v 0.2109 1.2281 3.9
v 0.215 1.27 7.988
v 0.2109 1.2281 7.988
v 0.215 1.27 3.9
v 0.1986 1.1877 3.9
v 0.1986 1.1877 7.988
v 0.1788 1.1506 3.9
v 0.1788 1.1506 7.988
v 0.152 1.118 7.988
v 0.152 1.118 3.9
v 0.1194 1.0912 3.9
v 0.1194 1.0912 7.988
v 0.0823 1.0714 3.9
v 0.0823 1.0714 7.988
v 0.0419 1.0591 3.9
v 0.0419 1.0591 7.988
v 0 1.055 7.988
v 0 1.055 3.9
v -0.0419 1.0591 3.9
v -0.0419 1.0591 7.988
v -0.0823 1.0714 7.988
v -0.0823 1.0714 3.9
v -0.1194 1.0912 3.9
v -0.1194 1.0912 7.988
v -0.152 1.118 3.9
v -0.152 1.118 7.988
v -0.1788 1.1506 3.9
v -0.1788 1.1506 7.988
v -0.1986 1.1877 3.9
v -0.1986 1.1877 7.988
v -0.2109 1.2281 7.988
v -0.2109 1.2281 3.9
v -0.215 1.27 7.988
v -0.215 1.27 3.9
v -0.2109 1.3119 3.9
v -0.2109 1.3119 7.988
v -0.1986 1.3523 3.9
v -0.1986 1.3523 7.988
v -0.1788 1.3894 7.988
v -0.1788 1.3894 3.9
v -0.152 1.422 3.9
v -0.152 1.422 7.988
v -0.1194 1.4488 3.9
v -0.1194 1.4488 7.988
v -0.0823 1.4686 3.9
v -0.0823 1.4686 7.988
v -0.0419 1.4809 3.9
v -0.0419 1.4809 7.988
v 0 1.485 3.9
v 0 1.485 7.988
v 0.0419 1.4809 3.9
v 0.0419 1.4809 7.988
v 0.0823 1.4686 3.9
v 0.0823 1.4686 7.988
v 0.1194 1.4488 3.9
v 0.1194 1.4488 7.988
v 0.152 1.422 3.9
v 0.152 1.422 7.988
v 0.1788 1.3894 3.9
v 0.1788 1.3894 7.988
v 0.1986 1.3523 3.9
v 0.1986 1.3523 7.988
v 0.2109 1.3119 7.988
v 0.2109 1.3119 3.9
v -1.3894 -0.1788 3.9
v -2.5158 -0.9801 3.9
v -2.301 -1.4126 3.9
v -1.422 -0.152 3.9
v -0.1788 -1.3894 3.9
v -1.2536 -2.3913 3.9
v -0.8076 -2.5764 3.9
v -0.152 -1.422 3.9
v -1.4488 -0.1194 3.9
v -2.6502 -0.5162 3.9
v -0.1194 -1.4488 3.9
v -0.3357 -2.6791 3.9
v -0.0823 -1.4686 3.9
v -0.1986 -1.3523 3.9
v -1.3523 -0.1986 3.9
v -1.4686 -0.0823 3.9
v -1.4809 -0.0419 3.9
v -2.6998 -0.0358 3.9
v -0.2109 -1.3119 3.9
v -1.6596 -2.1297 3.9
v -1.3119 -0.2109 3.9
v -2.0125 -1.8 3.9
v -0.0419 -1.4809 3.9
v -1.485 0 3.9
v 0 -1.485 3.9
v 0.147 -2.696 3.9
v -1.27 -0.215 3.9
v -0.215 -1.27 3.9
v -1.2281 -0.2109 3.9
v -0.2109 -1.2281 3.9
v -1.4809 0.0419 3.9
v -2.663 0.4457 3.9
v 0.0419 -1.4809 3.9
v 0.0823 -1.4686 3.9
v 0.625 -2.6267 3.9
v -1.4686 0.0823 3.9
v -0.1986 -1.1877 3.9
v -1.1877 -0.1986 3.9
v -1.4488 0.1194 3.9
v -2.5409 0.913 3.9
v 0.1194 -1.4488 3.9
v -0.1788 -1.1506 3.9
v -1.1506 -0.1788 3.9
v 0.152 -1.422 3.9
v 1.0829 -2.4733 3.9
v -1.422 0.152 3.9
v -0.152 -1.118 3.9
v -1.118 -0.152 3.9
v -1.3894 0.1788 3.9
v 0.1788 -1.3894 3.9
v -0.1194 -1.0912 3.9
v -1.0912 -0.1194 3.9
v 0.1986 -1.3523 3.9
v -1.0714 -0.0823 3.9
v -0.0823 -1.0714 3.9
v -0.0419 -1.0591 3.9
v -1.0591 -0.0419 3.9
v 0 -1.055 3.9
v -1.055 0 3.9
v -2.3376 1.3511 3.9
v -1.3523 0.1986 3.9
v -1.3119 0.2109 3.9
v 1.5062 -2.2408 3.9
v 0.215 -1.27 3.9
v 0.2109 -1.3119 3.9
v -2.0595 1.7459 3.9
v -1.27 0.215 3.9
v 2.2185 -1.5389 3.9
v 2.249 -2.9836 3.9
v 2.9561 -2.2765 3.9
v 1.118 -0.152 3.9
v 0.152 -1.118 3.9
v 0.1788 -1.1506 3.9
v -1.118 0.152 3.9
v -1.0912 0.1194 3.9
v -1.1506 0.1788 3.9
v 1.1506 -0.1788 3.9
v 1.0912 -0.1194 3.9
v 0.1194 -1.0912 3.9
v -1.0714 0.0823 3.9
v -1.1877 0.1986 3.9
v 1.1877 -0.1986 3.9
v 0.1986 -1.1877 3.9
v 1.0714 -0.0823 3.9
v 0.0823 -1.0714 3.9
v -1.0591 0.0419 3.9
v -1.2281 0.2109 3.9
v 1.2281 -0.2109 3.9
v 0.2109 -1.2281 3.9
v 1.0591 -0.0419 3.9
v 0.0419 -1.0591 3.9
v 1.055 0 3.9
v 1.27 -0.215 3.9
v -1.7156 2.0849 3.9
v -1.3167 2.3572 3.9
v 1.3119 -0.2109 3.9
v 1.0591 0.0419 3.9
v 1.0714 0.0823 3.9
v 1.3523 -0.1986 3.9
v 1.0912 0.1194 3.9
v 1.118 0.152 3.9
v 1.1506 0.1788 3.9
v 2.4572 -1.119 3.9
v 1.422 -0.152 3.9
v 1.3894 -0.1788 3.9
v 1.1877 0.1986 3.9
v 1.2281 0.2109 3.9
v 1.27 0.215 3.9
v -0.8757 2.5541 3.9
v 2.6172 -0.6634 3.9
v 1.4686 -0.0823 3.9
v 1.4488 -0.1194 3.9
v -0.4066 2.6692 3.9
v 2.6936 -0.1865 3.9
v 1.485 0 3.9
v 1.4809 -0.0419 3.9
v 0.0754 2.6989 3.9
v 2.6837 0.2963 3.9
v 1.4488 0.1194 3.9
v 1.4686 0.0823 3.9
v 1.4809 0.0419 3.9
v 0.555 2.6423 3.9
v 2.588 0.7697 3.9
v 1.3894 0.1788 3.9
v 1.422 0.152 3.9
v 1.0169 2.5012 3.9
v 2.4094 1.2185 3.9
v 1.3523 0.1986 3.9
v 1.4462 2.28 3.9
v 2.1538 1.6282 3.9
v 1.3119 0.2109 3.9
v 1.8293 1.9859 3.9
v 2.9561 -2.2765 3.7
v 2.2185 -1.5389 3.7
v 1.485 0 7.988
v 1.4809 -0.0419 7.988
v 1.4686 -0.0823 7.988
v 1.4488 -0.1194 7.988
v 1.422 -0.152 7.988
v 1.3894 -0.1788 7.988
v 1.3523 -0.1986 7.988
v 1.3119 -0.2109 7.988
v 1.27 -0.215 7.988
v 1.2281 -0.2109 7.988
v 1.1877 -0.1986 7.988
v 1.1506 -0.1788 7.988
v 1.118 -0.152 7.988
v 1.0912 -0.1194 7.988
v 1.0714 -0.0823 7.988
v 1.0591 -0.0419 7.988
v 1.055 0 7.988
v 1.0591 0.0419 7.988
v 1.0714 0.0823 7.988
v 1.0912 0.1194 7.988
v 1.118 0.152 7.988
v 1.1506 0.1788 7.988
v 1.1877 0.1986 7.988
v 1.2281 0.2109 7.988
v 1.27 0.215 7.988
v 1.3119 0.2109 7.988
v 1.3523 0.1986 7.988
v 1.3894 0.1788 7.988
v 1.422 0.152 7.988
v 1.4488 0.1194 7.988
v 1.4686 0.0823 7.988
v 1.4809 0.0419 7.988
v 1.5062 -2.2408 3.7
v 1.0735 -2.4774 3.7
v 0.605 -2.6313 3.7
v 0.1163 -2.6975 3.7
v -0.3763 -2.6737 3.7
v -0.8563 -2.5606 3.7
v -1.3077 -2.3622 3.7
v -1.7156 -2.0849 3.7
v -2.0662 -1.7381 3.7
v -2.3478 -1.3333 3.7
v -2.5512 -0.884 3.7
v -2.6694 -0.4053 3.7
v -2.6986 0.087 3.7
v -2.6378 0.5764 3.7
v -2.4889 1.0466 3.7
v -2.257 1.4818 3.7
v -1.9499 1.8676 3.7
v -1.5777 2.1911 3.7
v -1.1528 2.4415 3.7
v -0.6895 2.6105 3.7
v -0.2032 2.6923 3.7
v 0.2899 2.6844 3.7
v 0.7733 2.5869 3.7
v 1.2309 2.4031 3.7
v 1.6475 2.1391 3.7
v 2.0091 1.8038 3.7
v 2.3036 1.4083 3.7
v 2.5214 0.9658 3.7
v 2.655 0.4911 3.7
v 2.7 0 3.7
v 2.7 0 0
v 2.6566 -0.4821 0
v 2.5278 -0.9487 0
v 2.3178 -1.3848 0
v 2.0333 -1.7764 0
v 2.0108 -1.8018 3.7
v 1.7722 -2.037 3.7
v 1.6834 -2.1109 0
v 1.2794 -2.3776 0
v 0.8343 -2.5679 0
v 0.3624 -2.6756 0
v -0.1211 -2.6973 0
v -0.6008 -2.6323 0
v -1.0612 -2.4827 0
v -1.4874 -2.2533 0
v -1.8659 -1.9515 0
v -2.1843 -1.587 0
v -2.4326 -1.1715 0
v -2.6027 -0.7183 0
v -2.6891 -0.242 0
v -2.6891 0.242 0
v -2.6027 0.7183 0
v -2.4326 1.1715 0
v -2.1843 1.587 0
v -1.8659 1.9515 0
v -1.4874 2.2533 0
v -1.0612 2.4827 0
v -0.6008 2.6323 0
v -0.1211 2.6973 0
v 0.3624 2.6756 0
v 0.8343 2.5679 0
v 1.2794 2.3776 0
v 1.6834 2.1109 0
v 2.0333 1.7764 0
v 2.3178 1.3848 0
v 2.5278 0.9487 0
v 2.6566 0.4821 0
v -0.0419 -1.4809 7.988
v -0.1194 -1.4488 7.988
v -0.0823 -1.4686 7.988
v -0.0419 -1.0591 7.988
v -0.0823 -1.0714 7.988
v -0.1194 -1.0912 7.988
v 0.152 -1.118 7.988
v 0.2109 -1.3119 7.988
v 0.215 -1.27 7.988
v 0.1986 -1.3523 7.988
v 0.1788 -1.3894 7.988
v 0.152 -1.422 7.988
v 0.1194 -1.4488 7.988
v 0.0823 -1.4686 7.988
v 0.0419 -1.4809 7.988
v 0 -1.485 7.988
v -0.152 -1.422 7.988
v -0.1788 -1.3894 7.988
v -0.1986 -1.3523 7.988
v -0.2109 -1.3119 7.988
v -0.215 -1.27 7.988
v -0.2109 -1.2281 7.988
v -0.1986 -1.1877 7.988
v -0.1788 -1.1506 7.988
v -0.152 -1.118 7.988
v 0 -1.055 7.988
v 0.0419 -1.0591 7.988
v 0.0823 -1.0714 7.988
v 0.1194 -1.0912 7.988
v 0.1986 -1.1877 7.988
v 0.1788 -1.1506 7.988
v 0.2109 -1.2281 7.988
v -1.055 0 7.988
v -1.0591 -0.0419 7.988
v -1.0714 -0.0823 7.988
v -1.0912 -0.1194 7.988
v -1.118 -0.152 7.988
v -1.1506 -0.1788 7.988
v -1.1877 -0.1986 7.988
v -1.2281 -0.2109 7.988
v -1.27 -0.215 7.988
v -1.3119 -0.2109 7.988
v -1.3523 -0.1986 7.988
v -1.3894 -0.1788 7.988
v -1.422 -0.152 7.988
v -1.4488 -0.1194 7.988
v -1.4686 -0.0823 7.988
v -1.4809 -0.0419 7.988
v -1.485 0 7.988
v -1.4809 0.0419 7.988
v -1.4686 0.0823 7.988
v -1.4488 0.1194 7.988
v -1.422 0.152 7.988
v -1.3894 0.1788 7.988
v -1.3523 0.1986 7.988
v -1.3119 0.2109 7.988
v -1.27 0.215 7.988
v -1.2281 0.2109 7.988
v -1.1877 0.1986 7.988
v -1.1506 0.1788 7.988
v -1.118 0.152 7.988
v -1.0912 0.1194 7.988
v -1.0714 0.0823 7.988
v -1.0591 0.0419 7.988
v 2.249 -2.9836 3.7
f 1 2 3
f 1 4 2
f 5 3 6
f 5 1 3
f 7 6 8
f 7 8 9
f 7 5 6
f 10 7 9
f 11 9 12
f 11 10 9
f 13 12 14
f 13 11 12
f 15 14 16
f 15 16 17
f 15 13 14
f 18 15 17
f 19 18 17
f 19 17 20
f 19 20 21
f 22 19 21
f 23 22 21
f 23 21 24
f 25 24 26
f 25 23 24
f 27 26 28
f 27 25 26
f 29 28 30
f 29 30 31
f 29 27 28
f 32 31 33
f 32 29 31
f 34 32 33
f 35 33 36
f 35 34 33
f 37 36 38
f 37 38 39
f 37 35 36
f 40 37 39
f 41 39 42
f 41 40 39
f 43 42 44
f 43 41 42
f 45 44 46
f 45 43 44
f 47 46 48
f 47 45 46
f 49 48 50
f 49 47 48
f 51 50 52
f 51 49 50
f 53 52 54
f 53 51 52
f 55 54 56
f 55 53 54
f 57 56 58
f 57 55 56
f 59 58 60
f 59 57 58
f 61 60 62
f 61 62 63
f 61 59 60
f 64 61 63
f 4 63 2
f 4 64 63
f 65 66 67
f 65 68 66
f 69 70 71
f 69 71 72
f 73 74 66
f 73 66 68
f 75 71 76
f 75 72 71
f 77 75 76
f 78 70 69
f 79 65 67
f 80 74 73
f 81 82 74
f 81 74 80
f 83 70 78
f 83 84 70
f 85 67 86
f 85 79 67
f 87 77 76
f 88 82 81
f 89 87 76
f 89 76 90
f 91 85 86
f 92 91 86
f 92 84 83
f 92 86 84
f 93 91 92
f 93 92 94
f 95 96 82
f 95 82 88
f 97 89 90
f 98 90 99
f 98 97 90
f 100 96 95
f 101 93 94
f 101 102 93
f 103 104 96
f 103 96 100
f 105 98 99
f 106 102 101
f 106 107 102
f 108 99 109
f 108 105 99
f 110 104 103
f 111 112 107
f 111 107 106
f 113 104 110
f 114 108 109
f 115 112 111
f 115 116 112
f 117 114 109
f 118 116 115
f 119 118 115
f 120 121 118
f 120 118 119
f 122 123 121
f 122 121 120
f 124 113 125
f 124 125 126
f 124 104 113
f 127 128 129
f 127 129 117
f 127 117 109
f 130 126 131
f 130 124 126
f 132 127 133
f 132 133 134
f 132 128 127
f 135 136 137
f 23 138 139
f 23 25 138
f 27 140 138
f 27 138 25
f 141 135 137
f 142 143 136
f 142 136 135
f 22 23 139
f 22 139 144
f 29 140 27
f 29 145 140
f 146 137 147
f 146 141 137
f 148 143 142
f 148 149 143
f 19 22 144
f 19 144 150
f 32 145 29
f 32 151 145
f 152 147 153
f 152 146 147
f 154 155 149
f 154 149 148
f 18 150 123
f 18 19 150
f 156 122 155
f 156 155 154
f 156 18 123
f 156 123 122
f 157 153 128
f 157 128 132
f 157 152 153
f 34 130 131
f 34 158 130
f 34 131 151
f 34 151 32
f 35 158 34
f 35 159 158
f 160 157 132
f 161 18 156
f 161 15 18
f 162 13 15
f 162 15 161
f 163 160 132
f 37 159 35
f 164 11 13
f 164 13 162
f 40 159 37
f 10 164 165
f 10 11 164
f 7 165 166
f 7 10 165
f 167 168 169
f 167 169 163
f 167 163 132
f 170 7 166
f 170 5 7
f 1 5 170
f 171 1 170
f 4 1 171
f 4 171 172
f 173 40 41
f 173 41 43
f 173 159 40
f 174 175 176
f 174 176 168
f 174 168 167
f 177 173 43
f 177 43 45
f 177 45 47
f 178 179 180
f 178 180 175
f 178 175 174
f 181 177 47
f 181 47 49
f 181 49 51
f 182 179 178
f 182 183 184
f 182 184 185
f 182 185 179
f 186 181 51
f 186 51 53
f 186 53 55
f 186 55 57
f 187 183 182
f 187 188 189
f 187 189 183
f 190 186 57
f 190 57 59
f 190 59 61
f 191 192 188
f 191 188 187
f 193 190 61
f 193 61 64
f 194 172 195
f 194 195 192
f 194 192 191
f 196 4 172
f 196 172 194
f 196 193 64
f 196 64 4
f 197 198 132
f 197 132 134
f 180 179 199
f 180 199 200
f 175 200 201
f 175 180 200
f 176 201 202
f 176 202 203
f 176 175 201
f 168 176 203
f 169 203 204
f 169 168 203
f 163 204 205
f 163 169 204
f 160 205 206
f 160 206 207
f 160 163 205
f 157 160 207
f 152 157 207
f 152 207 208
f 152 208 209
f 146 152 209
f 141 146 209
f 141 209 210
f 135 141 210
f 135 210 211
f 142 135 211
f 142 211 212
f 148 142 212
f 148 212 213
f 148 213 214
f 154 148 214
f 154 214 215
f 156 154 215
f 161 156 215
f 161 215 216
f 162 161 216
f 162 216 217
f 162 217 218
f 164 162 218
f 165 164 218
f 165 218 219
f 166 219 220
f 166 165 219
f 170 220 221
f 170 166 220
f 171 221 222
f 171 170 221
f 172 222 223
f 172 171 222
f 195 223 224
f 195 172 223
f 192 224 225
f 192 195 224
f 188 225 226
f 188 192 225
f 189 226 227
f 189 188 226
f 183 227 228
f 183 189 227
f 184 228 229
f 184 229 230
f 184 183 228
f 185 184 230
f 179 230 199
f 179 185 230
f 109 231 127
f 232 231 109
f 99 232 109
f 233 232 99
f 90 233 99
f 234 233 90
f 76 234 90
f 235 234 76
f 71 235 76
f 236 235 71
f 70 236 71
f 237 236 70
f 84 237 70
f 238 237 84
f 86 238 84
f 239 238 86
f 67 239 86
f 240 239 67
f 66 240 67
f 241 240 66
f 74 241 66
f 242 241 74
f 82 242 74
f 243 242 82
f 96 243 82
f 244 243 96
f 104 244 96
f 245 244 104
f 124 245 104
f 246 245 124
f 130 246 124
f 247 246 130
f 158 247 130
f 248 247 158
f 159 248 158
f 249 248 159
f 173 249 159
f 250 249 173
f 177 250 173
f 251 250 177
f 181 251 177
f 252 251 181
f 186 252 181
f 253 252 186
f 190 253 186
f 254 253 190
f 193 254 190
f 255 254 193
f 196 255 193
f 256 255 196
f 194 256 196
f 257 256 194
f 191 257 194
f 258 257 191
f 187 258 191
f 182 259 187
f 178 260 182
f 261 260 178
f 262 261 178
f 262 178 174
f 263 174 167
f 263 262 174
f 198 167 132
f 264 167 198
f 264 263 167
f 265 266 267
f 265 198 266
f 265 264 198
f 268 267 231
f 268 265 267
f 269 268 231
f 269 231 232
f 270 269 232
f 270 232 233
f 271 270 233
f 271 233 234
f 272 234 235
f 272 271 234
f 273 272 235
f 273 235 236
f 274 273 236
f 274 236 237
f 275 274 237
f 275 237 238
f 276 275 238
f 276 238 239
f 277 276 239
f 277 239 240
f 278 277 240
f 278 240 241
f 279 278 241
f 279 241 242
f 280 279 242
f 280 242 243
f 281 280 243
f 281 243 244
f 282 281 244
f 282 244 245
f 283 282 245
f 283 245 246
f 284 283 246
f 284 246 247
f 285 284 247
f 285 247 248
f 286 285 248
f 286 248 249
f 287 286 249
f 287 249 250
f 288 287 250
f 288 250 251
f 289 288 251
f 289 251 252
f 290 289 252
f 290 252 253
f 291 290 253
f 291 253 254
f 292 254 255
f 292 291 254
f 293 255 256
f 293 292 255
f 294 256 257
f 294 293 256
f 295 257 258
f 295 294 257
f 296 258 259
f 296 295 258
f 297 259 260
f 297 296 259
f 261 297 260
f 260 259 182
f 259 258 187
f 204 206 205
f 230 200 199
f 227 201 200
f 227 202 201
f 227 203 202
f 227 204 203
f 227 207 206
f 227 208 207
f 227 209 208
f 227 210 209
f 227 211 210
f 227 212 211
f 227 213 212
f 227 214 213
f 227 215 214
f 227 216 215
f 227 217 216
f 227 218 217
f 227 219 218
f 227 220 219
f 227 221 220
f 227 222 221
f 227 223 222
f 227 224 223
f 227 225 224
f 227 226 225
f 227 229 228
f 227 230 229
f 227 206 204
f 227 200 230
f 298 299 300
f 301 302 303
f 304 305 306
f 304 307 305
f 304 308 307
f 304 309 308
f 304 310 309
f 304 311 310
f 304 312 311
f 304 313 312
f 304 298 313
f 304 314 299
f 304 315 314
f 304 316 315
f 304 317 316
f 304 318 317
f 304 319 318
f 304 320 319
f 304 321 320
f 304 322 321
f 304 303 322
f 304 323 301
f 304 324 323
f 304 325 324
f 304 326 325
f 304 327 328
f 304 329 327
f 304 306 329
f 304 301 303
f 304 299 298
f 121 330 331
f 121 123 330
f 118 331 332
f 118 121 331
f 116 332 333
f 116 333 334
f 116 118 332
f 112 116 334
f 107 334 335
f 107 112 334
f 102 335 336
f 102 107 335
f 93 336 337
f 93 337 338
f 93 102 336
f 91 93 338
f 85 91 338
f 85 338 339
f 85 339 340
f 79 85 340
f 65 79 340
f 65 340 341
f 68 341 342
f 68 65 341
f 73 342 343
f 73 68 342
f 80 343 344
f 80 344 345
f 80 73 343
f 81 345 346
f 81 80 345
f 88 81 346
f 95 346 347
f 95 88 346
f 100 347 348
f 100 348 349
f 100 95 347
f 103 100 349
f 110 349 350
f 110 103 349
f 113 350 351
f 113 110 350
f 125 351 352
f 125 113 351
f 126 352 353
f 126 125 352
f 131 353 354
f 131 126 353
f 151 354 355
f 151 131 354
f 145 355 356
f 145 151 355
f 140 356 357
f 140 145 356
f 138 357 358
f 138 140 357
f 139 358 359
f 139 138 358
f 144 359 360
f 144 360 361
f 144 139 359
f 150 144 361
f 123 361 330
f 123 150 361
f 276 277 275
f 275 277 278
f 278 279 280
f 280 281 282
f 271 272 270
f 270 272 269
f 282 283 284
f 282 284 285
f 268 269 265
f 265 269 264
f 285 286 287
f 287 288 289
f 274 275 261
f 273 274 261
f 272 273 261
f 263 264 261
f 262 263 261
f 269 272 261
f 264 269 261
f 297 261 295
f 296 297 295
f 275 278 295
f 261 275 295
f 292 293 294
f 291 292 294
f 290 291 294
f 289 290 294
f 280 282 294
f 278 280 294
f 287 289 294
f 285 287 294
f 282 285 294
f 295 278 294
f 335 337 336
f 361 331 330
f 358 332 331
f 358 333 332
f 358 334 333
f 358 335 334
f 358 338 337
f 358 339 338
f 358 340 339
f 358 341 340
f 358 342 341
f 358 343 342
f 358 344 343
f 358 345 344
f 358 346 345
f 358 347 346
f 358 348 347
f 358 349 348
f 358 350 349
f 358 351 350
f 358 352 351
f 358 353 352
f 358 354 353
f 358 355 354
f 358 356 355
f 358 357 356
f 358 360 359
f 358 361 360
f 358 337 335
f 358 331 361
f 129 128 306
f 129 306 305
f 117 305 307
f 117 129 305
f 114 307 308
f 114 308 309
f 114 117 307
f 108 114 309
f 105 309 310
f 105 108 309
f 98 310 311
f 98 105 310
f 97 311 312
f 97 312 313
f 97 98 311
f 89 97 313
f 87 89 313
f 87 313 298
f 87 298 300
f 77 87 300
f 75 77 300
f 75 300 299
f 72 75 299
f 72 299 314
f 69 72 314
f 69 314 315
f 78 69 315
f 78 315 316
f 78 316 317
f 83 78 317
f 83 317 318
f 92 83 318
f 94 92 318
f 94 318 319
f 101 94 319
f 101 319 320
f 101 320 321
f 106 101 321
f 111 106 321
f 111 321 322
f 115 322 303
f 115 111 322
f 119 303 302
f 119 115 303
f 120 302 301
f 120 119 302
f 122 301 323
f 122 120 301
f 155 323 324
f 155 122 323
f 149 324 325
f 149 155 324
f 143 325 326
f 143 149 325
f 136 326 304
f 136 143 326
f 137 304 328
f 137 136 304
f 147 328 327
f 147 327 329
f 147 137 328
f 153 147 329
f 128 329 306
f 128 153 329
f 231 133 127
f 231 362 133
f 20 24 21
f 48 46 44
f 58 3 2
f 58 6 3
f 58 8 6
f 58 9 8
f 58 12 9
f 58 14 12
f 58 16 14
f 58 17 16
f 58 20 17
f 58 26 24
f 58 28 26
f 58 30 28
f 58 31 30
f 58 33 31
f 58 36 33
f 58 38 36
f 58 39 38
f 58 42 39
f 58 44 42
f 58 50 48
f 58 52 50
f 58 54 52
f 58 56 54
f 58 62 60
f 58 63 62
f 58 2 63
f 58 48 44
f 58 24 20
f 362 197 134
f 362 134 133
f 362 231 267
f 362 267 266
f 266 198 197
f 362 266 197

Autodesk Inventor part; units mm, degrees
ref_plane "YZ Plane" through (0, 0, 0) normal (1, 0, 0) x (0, 1, 0)
ref_plane "XZ Plane" through (0, 0, 0) normal (0, 1, 0) x (-1, 0, 0)
ref_plane "XY Plane" through (0, 0, 0) normal (0, 0, 1) x (1, 0, 0)
sketch "Sketch1" plane through (0, 0, 0) normal (0, 0, 1) x (1, 0, 0)
  circle A0 centre (0, 0) radius 2.7
  dimension "d0" = 5.4
extrude "Extrusion1" add sketch "Sketch1" along normal blind 3.7
sketch "Sketch2" plane through (0, 0, 3.7) normal (0, 0, 1) x (1, 0, 0)
  circle A0 centre (0, 0) radius 1.27
  circle A1 centre (1.27, 0) radius 0.215
  circle A2 centre (0, 1.27) radius 0.215
  circle A3 centre (-1.27, 0) radius 0.215
  circle A4 centre (0, -1.27) radius 0.215
  dimension "d3" = 2.54
  dimension "d4" = 0.43
  dimension "d7" = 360
extrude "Extrusion2" add sketch "Sketch2" along normal blind 12.7 contours A0 A1 | A0 A1 | A2 A0 | A0 A2 | A4 A0 | A0 A4 | A3 A0 | A0 A3
sketch "Sketch3" plane through (0, 0, 3.7) normal (0, 0, 1) x (1, 0, 0)
  line L0 (2.9561, -2.2765) -> (2.249, -2.9836)
  line L1 (2.249, -2.9836) -> (1.4633, -2.1979)
  line L2 (1.4633, -2.1979) -> (2.1704, -1.4908)
  line L3 (2.1704, -1.4908) -> (2.9561, -2.2765)
  circle A0 centre (0, 0) radius 2.7 projected
  point P0 (2.2185, -1.5389)
  point P1 (1.5062, -2.2408)
  dimension "d11" = 1
  dimension "d12" = 6.4
extrude "Extrusion3" add sketch "Sketch3" along normal blind 0.2
sketch "Sketch4" plane through (0, 0, 3.9) normal (0, 0, 1) x (1, 0, 0)
  line L0 (-0.2098, -1.6461) -> (0.1759, -1.6461) construction
  line L1 (0.1759, -1.6461) -> (0.1759, -2.1461) construction
  line L2 (0.1759, -2.1461) -> (-0.2098, -2.1461) construction
  line L3 (-0.2098, -2.1461) -> (-0.2098, -1.6461) construction
  line L4 (1.5616, 0.2129) -> (1.9473, 0.2129) construction
  line L5 (1.9473, 0.2129) -> (1.9473, -0.2871) construction
  line L6 (1.9473, -0.2871) -> (1.5616, -0.2871) construction
  line L7 (1.5616, -0.2871) -> (1.5616, 0.2129) construction
  line L8 (-1.9384, 0.2505) -> (-1.5527, 0.2505) construction
  line L9 (-1.5527, 0.2505) -> (-1.5527, -0.2495) construction
  line L10 (-1.5527, -0.2495) -> (-1.9384, -0.2495) construction
  line L11 (-1.9384, -0.2495) -> (-1.9384, 0.2505) construction
  line L12 (-0.1933, 2.1269) -> (0.1924, 2.1269) construction
  line L13 (0.1924, 2.1269) -> (0.1924, 1.6269) construction
  line L14 (0.1924, 1.6269) -> (-0.1933, 1.6269) construction
  line L15 (-0.1933, 1.6269) -> (-0.1933, 2.1269) construction
  point P0 (0, 0)
move faces "Move1" translate (0, 0, -10) faces at (-0.0635, 1.2367, 16.4) (1.2786, 0.0711, 16.4) (-0.0635, -1.3033, 16.4) (-1.2446, 0.067, 16.4)
move faces "Move2" translate (0, 0, 1.588) faces at (-1.2446, 0.067, 6.4) (-0.0635, 1.2367, 6.4) (1.2786, 0.0711, 6.4) (-0.0635, -1.3033, 6.4)
properties part number "Sensor"
